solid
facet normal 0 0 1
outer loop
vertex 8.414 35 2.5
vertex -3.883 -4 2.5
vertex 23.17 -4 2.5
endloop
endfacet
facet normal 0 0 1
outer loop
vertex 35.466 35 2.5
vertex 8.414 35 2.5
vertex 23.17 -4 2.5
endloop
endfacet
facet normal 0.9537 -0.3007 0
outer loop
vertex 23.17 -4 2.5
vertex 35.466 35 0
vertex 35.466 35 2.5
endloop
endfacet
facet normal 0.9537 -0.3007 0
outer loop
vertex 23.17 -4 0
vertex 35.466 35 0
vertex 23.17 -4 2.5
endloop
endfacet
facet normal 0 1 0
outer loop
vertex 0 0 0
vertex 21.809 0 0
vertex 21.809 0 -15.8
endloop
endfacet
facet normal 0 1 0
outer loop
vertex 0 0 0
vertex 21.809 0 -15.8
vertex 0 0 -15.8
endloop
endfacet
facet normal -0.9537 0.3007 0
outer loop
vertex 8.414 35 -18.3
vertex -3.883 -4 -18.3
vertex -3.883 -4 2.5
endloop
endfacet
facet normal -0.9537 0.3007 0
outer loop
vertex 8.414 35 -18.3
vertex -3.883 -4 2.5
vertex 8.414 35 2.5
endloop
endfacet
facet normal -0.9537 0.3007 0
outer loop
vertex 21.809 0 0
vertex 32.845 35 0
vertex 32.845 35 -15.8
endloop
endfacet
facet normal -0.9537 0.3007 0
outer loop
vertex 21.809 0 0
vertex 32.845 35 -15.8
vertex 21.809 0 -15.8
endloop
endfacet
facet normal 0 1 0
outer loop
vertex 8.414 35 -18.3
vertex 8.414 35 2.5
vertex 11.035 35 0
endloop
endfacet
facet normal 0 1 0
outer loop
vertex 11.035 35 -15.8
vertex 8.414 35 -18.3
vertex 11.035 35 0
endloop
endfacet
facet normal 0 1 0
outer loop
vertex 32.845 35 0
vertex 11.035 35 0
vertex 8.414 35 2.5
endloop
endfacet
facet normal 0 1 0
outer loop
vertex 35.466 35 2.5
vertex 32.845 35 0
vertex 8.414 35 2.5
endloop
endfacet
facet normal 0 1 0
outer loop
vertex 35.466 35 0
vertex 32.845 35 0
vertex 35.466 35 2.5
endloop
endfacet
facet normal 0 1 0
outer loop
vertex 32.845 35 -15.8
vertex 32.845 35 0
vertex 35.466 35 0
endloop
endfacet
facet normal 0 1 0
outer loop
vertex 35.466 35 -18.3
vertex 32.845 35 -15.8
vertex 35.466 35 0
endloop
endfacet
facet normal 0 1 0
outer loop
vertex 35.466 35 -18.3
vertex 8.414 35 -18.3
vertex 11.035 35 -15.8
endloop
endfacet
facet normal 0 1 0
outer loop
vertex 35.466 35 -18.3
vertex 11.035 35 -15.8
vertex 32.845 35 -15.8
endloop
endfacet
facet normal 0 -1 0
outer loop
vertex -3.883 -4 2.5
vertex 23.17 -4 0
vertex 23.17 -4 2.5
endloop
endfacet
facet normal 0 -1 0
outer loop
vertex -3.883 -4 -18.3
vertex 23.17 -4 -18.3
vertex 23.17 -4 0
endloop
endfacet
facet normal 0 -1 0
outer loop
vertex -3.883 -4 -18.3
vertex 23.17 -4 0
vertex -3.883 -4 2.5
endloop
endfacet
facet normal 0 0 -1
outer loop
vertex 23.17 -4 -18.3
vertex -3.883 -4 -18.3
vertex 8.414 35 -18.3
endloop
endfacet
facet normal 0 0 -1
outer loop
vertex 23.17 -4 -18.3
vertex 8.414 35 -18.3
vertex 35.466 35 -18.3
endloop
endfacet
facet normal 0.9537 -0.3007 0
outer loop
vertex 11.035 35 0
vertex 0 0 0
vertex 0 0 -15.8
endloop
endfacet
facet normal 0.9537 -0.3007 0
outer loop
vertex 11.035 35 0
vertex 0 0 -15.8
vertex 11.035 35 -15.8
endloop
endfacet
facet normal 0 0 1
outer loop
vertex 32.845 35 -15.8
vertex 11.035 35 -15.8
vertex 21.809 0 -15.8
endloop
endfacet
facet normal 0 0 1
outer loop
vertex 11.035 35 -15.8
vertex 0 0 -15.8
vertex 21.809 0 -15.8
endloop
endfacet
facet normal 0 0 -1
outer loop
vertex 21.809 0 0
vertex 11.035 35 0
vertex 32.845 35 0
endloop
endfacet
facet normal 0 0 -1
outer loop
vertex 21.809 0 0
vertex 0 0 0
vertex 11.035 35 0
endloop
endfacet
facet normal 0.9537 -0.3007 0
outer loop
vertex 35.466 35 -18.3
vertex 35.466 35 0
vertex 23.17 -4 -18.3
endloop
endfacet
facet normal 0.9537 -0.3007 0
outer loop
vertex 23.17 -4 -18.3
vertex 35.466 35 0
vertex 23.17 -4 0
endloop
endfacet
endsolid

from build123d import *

# Parameters (mm, degrees)
F1_DEPTH = 15.8
F3_DEPTH = 2.5
F4_START = -18.3
F4_DEPTH = 2.5


with BuildPart() as f1:
    # F0 (on Top) → F1 (new body)
    with BuildSketch(Plane.XY):
        Polygon((21.8094058029, 0), (0, 0), (11.0354576108, 35), (8.4141347979, 35), (-3.8825179684, -4), (23.1695334603, -4), (35.4661862265, 35), (32.8448634137, 35), align=None)
    extrude(amount=-F1_DEPTH)

    # F2 (on face) → F3 (join)
    with BuildSketch(Plane(origin=(0, 0, -15.8), x_dir=(1, 0, 0), z_dir=(0, 0, -1))):
        Polygon((11.0354576108, -35), (32.8448634137, -35), (21.8094058029, 0), (0, 0), align=None)
        Polygon((32.8448634137, -35), (35.4661862265, -35), (23.1695334603, 4), (-3.8825179684, 4), (8.4141347979, -35), (11.0354576108, -35), (0, 0), (21.8094058029, 0), align=None)
    extrude(amount=F3_DEPTH)

    # F3_face (on face) → F4 (join)
    with BuildSketch(Plane(origin=(15.7918341291, 15.5, -18.3), x_dir=(1, 0, 0), z_dir=(0, 0, -1)).offset(F4_START)):
        Polygon((19.6743520975, -19.5), (7.3776993312, 19.5), (-19.6743520975, 19.5), (-7.3776993312, -19.5), align=None)
    extrude(amount=-F4_DEPTH)


solid = f1.part
